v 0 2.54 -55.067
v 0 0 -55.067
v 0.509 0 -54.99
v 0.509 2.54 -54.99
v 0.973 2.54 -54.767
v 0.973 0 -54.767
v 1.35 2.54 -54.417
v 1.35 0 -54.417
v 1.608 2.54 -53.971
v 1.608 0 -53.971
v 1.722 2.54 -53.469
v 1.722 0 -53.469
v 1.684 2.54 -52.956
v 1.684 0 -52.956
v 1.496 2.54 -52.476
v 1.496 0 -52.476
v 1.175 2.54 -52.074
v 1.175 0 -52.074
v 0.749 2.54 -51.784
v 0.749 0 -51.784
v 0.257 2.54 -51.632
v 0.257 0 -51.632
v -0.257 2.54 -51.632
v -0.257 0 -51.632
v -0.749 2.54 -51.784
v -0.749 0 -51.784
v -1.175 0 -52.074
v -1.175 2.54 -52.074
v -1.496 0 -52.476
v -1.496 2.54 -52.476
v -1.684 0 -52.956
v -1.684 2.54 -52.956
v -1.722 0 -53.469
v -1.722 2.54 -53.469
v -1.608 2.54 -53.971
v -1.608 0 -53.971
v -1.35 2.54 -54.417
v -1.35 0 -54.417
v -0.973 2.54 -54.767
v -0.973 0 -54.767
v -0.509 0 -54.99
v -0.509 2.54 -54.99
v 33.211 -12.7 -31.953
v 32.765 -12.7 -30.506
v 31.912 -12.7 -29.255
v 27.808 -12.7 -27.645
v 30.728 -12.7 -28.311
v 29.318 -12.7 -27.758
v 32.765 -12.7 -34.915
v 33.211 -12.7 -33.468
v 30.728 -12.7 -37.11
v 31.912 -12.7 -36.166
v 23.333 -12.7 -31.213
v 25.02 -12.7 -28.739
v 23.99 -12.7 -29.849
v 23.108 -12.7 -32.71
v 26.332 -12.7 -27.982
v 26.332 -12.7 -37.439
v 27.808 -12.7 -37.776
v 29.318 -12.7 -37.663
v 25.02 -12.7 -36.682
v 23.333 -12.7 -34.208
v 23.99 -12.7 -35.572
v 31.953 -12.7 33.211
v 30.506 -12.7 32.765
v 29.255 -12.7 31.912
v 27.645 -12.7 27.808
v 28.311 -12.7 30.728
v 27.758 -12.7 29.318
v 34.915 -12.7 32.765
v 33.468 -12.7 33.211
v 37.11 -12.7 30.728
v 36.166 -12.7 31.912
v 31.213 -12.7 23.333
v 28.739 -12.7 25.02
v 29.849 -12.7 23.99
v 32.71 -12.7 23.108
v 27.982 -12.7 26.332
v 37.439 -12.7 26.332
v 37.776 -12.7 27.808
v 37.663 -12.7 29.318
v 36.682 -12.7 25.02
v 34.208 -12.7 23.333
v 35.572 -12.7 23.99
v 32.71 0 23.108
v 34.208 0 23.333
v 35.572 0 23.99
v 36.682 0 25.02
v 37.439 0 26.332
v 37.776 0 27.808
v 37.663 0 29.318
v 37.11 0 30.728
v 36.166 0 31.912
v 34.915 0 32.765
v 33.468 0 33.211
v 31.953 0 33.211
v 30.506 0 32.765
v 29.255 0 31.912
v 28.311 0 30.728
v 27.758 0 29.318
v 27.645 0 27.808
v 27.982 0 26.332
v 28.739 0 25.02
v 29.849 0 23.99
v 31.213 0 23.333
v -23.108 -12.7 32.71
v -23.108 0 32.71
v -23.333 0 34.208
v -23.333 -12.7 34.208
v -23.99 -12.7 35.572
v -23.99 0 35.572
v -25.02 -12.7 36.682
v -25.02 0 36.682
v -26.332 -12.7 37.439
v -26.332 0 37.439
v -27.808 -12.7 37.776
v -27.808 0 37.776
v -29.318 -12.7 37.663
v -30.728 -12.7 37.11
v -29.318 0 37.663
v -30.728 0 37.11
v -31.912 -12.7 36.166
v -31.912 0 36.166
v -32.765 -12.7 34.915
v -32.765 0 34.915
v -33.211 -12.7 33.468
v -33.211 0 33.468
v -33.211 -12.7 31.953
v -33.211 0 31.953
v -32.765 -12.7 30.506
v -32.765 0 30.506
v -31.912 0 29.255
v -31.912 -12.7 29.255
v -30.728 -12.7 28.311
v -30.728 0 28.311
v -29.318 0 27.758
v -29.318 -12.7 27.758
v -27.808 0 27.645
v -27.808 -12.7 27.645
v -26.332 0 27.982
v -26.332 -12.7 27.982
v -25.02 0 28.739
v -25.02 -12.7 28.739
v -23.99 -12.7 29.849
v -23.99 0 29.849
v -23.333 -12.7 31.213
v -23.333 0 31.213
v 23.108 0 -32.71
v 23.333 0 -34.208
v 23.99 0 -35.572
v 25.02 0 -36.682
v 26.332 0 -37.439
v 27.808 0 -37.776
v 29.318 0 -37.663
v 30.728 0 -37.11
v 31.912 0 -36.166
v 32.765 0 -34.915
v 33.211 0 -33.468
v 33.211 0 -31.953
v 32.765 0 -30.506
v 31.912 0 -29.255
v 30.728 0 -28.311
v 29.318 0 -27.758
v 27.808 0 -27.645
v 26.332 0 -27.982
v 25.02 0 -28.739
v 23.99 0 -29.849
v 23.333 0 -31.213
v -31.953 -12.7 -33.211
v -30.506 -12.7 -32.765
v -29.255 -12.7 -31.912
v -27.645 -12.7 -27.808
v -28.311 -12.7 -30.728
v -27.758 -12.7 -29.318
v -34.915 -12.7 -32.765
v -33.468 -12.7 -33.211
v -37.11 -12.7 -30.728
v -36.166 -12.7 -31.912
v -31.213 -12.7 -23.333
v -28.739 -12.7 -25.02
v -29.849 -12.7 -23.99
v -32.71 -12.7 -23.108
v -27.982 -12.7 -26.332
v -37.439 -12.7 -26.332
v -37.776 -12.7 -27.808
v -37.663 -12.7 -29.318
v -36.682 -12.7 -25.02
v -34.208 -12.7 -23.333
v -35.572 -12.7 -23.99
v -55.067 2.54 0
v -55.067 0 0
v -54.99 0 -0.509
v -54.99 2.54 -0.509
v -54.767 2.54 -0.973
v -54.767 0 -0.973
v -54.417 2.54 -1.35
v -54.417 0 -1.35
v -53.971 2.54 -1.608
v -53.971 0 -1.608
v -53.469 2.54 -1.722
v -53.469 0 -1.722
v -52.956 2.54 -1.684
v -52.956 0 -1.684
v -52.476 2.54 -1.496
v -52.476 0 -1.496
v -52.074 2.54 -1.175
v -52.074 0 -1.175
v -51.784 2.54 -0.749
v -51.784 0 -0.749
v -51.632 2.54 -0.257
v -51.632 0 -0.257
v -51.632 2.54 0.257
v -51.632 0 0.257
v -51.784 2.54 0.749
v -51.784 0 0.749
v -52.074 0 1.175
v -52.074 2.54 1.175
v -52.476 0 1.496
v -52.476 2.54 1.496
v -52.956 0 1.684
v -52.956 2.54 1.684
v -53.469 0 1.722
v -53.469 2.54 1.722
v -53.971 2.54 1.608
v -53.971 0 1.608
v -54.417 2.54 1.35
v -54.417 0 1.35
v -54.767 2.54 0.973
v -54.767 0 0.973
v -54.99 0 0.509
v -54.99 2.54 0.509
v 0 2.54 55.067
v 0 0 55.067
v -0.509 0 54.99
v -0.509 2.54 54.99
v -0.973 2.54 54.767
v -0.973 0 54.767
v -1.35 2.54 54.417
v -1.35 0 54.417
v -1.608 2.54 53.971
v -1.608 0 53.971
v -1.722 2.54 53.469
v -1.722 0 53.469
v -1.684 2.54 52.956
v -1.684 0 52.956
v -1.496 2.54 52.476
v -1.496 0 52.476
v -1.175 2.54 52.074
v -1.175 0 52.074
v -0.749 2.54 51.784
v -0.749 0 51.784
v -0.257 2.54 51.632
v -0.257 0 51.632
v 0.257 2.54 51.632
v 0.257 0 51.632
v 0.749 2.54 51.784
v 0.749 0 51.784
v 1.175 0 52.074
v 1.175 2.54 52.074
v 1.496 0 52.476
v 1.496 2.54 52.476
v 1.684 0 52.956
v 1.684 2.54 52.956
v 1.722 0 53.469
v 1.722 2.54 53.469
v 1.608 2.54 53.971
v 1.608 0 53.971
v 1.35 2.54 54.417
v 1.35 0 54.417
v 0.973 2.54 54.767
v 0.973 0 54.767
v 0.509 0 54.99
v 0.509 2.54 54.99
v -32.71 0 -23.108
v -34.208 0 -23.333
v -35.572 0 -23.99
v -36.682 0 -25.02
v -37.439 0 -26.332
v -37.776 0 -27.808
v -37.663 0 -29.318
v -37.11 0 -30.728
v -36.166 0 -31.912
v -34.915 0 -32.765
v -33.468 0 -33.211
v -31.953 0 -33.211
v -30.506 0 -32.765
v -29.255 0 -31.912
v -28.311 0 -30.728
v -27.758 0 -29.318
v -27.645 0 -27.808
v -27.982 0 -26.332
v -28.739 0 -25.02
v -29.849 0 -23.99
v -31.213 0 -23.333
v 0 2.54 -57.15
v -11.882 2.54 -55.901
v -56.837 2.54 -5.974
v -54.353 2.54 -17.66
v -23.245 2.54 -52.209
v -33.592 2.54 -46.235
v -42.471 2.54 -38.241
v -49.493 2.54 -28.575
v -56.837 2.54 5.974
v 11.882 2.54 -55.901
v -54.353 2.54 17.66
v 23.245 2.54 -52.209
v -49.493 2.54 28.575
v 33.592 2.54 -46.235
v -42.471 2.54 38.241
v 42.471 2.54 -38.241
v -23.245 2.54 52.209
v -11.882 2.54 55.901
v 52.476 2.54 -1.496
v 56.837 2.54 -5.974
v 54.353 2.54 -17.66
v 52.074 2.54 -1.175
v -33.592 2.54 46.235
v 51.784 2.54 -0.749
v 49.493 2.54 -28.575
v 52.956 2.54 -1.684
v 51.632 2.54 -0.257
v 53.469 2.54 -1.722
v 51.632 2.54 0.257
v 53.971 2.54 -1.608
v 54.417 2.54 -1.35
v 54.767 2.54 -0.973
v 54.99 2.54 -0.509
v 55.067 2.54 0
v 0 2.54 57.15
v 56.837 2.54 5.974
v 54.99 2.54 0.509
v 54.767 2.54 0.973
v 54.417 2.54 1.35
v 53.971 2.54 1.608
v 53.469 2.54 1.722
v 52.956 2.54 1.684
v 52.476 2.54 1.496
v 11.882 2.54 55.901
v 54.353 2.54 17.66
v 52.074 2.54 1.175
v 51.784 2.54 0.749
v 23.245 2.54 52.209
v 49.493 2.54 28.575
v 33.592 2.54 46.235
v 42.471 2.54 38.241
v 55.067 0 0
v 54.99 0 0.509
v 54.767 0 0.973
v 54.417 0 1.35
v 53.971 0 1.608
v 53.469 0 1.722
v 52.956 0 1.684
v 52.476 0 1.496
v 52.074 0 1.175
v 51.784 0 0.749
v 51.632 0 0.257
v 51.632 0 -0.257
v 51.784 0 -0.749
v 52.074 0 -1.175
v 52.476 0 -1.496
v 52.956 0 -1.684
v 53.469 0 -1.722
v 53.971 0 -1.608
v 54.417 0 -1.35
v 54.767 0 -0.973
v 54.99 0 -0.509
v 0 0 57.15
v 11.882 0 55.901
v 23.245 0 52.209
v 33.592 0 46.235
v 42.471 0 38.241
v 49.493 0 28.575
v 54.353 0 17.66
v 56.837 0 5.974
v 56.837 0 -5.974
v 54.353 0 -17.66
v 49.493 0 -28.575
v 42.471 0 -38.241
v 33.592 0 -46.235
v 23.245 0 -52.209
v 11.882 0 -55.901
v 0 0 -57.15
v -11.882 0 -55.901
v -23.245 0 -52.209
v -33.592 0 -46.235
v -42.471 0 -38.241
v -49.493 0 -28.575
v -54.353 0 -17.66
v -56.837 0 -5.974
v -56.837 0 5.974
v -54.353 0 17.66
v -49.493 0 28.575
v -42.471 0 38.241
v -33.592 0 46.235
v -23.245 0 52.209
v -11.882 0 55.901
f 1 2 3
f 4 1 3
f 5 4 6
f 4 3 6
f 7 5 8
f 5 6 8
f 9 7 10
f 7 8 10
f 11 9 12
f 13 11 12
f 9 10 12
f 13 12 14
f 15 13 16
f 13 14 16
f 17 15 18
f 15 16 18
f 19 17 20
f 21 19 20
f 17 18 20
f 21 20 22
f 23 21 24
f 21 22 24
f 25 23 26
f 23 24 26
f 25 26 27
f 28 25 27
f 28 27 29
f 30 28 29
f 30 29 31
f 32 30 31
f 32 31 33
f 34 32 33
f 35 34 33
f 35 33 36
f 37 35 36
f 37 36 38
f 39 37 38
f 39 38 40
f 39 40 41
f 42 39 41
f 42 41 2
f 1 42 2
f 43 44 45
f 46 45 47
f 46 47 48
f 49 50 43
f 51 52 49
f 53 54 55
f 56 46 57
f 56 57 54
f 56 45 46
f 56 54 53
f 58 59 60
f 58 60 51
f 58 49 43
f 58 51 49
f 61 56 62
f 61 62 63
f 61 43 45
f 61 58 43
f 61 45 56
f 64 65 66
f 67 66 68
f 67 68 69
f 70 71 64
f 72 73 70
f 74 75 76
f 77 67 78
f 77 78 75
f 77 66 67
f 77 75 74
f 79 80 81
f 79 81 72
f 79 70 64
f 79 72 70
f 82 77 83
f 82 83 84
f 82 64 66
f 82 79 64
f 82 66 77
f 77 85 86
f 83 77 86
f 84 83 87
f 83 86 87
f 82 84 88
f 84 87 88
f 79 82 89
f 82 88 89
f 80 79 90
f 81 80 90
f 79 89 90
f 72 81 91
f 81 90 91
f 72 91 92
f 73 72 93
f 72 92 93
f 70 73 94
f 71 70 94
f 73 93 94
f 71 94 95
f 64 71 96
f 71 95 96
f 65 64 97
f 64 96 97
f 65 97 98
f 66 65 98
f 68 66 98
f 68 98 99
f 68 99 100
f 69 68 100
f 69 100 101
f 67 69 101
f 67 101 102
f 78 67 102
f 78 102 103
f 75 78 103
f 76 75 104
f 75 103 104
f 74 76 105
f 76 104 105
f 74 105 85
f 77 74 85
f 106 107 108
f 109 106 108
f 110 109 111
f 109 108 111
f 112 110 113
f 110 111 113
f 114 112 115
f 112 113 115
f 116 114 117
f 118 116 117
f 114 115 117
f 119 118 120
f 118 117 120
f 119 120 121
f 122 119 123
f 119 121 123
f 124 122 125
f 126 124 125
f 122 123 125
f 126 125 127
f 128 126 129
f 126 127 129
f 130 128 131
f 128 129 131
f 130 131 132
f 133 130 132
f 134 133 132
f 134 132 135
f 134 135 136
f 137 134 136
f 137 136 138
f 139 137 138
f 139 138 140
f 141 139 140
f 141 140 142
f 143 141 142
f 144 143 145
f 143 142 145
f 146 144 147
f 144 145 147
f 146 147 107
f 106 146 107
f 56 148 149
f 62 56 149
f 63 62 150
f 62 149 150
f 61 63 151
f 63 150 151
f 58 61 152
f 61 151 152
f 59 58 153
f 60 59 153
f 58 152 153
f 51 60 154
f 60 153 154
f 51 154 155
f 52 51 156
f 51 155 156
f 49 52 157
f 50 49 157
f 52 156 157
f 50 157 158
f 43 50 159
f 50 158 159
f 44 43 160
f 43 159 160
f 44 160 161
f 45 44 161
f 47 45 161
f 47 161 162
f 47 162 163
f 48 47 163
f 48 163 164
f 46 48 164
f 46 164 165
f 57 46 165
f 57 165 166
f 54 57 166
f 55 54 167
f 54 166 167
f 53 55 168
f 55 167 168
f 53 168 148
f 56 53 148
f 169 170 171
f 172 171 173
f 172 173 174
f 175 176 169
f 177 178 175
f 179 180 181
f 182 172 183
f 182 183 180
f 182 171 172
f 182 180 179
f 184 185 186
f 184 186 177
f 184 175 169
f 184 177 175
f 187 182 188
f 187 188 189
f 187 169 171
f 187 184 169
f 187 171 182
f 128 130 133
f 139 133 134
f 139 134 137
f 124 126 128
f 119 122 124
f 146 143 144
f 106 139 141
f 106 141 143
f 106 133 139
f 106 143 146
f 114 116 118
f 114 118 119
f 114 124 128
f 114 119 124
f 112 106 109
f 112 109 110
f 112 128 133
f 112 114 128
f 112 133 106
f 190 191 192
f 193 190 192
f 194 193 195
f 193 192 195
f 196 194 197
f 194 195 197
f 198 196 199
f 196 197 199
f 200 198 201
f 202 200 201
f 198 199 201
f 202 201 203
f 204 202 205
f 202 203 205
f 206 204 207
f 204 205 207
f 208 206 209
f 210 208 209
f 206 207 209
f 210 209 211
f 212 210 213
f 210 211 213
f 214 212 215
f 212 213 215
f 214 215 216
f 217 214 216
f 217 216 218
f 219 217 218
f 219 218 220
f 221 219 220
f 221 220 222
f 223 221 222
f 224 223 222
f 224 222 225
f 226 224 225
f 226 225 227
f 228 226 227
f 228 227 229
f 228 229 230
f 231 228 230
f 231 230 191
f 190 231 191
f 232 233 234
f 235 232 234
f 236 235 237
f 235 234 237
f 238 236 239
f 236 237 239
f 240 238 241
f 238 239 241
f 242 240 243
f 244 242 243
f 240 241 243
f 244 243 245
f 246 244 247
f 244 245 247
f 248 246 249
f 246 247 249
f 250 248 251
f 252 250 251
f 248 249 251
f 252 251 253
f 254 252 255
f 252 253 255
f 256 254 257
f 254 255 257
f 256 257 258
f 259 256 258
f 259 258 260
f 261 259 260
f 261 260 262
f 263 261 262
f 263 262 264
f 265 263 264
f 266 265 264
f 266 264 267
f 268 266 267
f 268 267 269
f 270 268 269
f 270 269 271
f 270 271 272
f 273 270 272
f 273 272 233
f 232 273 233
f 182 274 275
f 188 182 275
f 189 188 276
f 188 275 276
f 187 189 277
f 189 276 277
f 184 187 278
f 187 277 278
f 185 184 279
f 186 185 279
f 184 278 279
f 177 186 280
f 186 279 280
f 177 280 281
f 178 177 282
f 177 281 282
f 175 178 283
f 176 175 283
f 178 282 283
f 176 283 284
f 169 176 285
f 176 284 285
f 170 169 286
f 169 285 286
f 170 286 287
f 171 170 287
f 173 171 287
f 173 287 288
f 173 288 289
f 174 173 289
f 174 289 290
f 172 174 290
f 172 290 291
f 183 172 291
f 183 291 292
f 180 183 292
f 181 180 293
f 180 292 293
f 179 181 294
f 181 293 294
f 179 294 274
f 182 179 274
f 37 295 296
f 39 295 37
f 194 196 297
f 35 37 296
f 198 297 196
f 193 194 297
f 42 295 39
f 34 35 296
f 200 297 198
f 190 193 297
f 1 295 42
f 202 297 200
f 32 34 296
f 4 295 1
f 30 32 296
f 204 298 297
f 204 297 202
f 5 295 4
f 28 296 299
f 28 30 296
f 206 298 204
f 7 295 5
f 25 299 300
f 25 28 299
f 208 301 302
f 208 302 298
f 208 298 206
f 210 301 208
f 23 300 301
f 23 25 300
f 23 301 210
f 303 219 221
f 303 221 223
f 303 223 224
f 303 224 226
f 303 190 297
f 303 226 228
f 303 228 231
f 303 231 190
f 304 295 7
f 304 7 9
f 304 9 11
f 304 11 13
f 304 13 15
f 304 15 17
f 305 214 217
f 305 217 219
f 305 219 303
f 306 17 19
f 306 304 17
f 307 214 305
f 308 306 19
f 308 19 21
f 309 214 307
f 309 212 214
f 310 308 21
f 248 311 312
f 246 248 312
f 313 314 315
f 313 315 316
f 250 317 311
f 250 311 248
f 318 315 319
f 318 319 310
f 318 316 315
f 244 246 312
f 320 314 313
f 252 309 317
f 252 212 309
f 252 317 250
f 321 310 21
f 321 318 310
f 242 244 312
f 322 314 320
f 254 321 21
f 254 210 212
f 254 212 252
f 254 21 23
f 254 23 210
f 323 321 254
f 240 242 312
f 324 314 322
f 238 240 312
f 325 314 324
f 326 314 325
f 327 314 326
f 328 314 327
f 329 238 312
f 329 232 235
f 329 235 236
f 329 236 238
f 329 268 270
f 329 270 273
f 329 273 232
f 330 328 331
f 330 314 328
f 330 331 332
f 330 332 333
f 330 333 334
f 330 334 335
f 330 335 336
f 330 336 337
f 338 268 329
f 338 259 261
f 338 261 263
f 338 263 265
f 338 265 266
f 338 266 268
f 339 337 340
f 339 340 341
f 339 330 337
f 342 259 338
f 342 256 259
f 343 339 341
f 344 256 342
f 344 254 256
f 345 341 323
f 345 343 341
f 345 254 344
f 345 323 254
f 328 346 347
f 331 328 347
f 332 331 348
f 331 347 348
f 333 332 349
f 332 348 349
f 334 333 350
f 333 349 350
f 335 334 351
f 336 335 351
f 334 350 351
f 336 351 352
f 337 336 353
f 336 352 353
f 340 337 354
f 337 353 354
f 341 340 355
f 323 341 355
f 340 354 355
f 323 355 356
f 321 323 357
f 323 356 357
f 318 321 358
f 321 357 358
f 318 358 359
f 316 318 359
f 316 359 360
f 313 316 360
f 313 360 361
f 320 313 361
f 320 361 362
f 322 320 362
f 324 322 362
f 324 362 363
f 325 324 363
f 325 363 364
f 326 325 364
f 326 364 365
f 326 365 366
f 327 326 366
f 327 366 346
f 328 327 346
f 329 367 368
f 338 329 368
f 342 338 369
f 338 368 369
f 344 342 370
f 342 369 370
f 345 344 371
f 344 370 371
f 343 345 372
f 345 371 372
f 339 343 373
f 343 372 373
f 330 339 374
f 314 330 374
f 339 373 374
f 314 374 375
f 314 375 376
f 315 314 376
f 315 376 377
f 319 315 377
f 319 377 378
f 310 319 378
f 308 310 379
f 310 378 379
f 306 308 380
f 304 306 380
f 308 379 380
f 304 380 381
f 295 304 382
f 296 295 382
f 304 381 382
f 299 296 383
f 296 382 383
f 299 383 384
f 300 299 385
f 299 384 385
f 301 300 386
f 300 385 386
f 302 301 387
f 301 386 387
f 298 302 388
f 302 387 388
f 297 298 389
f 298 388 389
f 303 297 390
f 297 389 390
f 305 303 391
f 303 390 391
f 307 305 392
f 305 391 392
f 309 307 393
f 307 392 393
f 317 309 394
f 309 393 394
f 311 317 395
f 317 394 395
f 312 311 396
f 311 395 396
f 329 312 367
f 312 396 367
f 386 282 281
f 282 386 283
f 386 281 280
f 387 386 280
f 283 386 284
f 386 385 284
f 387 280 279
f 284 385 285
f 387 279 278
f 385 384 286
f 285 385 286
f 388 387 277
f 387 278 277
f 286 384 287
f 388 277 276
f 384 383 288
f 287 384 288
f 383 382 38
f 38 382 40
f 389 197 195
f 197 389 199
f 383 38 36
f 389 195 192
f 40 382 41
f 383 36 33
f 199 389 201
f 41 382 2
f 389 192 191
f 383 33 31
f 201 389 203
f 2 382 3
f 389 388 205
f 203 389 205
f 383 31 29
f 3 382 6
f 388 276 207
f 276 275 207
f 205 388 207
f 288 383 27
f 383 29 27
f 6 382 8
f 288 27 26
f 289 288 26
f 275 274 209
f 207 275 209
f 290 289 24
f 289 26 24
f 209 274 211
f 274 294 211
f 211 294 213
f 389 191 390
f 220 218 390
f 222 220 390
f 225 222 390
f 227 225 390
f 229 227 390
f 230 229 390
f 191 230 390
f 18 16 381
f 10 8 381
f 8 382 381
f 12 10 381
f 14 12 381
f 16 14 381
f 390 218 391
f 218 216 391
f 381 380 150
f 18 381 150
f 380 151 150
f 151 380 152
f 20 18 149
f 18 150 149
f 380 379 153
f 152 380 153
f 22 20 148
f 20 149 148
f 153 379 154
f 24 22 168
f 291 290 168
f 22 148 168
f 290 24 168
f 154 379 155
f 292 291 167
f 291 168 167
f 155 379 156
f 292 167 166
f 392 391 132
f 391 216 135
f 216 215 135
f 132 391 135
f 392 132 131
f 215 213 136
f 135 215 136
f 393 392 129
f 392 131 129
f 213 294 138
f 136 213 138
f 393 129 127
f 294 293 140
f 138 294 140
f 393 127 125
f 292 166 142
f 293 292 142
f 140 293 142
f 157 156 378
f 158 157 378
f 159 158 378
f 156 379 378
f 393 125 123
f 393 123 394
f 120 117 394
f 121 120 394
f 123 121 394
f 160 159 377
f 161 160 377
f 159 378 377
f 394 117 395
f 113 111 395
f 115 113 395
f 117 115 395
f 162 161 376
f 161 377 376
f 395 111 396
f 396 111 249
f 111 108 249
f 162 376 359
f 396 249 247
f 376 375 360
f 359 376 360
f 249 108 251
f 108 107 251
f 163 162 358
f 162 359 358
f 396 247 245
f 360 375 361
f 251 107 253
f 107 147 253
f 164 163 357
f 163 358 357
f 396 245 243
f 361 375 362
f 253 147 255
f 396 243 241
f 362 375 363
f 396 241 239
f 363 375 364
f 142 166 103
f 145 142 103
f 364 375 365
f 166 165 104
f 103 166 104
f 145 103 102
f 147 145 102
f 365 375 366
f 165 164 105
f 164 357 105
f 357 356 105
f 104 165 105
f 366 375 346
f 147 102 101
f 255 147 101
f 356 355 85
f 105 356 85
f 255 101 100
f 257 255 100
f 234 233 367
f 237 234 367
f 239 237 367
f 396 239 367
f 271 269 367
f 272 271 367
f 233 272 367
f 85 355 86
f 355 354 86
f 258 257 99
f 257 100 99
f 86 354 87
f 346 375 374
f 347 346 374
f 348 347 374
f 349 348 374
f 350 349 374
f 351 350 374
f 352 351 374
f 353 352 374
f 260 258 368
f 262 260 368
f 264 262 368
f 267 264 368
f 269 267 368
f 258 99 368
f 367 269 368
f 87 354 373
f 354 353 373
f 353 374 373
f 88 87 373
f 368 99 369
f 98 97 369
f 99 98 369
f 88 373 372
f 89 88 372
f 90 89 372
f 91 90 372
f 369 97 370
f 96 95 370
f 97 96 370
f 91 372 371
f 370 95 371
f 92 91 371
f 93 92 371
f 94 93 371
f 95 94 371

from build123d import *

# Parameters (mm, degrees)
SKETCH2_R             = 57.15
BOSS_EXTRUDE1_DEPTH   = 2.54
SKETCH3_R             = 5.08
BOSS_EXTRUDE2_DEPTH   = 12.7
CIRPATTERN1_COUNT     = 4
F_8_32_TAPPED_HOLE1_D = 3.4544
CIRPATTERN2_COUNT     = 4


with BuildPart() as part:
    # Sketch2 → Boss-Extrude1 (new body)
    with BuildSketch(Plane(origin=(0, 0, 0), x_dir=(1, 0, 0), z_dir=(0, 1, 0))):
        with Locations(Location((0, 0, 0), (0, 0, 270))):
            Circle(SKETCH2_R)
    extrude(amount=BOSS_EXTRUDE1_DEPTH)

    # Sketch3 → Boss-Extrude2 (add)
    with BuildSketch(Plane.XZ):
        with Locations(Location((-32.710383859, -28.187642467, 0), (0, 0, 90))):
            Circle(SKETCH3_R)
    boss_extrude2 = extrude(amount=BOSS_EXTRUDE2_DEPTH)

    # CirPattern1: Boss-Extrude2 ×4 about axis
    cirpattern1_axis = Axis((0, 0, 0), (0, 1, 0))
    for i in range(1, CIRPATTERN1_COUNT):
        add(boss_extrude2.rotate(cirpattern1_axis, i * 360 / CIRPATTERN1_COUNT))

    # #8-32 Tapped Hole1 (through all)
    with Locations(Plane(origin=(0, 2.54, 0), x_dir=(1, 0, 0), z_dir=(0, 1, 0))):
        with Locations((-53.34, 0)):
            f_8_32_tapped_hole1 = Hole(F_8_32_TAPPED_HOLE1_D / 2)

    # CirPattern2: #8-32 Tapped Hole1 ×4 about axis
    cirpattern2_axis = Axis((0, 0, 0), (0, 1, 0))
    for i in range(1, CIRPATTERN2_COUNT):
        add(f_8_32_tapped_hole1.rotate(cirpattern2_axis, i * 360 / CIRPATTERN2_COUNT), mode=Mode.SUBTRACT)


solid = part.part
